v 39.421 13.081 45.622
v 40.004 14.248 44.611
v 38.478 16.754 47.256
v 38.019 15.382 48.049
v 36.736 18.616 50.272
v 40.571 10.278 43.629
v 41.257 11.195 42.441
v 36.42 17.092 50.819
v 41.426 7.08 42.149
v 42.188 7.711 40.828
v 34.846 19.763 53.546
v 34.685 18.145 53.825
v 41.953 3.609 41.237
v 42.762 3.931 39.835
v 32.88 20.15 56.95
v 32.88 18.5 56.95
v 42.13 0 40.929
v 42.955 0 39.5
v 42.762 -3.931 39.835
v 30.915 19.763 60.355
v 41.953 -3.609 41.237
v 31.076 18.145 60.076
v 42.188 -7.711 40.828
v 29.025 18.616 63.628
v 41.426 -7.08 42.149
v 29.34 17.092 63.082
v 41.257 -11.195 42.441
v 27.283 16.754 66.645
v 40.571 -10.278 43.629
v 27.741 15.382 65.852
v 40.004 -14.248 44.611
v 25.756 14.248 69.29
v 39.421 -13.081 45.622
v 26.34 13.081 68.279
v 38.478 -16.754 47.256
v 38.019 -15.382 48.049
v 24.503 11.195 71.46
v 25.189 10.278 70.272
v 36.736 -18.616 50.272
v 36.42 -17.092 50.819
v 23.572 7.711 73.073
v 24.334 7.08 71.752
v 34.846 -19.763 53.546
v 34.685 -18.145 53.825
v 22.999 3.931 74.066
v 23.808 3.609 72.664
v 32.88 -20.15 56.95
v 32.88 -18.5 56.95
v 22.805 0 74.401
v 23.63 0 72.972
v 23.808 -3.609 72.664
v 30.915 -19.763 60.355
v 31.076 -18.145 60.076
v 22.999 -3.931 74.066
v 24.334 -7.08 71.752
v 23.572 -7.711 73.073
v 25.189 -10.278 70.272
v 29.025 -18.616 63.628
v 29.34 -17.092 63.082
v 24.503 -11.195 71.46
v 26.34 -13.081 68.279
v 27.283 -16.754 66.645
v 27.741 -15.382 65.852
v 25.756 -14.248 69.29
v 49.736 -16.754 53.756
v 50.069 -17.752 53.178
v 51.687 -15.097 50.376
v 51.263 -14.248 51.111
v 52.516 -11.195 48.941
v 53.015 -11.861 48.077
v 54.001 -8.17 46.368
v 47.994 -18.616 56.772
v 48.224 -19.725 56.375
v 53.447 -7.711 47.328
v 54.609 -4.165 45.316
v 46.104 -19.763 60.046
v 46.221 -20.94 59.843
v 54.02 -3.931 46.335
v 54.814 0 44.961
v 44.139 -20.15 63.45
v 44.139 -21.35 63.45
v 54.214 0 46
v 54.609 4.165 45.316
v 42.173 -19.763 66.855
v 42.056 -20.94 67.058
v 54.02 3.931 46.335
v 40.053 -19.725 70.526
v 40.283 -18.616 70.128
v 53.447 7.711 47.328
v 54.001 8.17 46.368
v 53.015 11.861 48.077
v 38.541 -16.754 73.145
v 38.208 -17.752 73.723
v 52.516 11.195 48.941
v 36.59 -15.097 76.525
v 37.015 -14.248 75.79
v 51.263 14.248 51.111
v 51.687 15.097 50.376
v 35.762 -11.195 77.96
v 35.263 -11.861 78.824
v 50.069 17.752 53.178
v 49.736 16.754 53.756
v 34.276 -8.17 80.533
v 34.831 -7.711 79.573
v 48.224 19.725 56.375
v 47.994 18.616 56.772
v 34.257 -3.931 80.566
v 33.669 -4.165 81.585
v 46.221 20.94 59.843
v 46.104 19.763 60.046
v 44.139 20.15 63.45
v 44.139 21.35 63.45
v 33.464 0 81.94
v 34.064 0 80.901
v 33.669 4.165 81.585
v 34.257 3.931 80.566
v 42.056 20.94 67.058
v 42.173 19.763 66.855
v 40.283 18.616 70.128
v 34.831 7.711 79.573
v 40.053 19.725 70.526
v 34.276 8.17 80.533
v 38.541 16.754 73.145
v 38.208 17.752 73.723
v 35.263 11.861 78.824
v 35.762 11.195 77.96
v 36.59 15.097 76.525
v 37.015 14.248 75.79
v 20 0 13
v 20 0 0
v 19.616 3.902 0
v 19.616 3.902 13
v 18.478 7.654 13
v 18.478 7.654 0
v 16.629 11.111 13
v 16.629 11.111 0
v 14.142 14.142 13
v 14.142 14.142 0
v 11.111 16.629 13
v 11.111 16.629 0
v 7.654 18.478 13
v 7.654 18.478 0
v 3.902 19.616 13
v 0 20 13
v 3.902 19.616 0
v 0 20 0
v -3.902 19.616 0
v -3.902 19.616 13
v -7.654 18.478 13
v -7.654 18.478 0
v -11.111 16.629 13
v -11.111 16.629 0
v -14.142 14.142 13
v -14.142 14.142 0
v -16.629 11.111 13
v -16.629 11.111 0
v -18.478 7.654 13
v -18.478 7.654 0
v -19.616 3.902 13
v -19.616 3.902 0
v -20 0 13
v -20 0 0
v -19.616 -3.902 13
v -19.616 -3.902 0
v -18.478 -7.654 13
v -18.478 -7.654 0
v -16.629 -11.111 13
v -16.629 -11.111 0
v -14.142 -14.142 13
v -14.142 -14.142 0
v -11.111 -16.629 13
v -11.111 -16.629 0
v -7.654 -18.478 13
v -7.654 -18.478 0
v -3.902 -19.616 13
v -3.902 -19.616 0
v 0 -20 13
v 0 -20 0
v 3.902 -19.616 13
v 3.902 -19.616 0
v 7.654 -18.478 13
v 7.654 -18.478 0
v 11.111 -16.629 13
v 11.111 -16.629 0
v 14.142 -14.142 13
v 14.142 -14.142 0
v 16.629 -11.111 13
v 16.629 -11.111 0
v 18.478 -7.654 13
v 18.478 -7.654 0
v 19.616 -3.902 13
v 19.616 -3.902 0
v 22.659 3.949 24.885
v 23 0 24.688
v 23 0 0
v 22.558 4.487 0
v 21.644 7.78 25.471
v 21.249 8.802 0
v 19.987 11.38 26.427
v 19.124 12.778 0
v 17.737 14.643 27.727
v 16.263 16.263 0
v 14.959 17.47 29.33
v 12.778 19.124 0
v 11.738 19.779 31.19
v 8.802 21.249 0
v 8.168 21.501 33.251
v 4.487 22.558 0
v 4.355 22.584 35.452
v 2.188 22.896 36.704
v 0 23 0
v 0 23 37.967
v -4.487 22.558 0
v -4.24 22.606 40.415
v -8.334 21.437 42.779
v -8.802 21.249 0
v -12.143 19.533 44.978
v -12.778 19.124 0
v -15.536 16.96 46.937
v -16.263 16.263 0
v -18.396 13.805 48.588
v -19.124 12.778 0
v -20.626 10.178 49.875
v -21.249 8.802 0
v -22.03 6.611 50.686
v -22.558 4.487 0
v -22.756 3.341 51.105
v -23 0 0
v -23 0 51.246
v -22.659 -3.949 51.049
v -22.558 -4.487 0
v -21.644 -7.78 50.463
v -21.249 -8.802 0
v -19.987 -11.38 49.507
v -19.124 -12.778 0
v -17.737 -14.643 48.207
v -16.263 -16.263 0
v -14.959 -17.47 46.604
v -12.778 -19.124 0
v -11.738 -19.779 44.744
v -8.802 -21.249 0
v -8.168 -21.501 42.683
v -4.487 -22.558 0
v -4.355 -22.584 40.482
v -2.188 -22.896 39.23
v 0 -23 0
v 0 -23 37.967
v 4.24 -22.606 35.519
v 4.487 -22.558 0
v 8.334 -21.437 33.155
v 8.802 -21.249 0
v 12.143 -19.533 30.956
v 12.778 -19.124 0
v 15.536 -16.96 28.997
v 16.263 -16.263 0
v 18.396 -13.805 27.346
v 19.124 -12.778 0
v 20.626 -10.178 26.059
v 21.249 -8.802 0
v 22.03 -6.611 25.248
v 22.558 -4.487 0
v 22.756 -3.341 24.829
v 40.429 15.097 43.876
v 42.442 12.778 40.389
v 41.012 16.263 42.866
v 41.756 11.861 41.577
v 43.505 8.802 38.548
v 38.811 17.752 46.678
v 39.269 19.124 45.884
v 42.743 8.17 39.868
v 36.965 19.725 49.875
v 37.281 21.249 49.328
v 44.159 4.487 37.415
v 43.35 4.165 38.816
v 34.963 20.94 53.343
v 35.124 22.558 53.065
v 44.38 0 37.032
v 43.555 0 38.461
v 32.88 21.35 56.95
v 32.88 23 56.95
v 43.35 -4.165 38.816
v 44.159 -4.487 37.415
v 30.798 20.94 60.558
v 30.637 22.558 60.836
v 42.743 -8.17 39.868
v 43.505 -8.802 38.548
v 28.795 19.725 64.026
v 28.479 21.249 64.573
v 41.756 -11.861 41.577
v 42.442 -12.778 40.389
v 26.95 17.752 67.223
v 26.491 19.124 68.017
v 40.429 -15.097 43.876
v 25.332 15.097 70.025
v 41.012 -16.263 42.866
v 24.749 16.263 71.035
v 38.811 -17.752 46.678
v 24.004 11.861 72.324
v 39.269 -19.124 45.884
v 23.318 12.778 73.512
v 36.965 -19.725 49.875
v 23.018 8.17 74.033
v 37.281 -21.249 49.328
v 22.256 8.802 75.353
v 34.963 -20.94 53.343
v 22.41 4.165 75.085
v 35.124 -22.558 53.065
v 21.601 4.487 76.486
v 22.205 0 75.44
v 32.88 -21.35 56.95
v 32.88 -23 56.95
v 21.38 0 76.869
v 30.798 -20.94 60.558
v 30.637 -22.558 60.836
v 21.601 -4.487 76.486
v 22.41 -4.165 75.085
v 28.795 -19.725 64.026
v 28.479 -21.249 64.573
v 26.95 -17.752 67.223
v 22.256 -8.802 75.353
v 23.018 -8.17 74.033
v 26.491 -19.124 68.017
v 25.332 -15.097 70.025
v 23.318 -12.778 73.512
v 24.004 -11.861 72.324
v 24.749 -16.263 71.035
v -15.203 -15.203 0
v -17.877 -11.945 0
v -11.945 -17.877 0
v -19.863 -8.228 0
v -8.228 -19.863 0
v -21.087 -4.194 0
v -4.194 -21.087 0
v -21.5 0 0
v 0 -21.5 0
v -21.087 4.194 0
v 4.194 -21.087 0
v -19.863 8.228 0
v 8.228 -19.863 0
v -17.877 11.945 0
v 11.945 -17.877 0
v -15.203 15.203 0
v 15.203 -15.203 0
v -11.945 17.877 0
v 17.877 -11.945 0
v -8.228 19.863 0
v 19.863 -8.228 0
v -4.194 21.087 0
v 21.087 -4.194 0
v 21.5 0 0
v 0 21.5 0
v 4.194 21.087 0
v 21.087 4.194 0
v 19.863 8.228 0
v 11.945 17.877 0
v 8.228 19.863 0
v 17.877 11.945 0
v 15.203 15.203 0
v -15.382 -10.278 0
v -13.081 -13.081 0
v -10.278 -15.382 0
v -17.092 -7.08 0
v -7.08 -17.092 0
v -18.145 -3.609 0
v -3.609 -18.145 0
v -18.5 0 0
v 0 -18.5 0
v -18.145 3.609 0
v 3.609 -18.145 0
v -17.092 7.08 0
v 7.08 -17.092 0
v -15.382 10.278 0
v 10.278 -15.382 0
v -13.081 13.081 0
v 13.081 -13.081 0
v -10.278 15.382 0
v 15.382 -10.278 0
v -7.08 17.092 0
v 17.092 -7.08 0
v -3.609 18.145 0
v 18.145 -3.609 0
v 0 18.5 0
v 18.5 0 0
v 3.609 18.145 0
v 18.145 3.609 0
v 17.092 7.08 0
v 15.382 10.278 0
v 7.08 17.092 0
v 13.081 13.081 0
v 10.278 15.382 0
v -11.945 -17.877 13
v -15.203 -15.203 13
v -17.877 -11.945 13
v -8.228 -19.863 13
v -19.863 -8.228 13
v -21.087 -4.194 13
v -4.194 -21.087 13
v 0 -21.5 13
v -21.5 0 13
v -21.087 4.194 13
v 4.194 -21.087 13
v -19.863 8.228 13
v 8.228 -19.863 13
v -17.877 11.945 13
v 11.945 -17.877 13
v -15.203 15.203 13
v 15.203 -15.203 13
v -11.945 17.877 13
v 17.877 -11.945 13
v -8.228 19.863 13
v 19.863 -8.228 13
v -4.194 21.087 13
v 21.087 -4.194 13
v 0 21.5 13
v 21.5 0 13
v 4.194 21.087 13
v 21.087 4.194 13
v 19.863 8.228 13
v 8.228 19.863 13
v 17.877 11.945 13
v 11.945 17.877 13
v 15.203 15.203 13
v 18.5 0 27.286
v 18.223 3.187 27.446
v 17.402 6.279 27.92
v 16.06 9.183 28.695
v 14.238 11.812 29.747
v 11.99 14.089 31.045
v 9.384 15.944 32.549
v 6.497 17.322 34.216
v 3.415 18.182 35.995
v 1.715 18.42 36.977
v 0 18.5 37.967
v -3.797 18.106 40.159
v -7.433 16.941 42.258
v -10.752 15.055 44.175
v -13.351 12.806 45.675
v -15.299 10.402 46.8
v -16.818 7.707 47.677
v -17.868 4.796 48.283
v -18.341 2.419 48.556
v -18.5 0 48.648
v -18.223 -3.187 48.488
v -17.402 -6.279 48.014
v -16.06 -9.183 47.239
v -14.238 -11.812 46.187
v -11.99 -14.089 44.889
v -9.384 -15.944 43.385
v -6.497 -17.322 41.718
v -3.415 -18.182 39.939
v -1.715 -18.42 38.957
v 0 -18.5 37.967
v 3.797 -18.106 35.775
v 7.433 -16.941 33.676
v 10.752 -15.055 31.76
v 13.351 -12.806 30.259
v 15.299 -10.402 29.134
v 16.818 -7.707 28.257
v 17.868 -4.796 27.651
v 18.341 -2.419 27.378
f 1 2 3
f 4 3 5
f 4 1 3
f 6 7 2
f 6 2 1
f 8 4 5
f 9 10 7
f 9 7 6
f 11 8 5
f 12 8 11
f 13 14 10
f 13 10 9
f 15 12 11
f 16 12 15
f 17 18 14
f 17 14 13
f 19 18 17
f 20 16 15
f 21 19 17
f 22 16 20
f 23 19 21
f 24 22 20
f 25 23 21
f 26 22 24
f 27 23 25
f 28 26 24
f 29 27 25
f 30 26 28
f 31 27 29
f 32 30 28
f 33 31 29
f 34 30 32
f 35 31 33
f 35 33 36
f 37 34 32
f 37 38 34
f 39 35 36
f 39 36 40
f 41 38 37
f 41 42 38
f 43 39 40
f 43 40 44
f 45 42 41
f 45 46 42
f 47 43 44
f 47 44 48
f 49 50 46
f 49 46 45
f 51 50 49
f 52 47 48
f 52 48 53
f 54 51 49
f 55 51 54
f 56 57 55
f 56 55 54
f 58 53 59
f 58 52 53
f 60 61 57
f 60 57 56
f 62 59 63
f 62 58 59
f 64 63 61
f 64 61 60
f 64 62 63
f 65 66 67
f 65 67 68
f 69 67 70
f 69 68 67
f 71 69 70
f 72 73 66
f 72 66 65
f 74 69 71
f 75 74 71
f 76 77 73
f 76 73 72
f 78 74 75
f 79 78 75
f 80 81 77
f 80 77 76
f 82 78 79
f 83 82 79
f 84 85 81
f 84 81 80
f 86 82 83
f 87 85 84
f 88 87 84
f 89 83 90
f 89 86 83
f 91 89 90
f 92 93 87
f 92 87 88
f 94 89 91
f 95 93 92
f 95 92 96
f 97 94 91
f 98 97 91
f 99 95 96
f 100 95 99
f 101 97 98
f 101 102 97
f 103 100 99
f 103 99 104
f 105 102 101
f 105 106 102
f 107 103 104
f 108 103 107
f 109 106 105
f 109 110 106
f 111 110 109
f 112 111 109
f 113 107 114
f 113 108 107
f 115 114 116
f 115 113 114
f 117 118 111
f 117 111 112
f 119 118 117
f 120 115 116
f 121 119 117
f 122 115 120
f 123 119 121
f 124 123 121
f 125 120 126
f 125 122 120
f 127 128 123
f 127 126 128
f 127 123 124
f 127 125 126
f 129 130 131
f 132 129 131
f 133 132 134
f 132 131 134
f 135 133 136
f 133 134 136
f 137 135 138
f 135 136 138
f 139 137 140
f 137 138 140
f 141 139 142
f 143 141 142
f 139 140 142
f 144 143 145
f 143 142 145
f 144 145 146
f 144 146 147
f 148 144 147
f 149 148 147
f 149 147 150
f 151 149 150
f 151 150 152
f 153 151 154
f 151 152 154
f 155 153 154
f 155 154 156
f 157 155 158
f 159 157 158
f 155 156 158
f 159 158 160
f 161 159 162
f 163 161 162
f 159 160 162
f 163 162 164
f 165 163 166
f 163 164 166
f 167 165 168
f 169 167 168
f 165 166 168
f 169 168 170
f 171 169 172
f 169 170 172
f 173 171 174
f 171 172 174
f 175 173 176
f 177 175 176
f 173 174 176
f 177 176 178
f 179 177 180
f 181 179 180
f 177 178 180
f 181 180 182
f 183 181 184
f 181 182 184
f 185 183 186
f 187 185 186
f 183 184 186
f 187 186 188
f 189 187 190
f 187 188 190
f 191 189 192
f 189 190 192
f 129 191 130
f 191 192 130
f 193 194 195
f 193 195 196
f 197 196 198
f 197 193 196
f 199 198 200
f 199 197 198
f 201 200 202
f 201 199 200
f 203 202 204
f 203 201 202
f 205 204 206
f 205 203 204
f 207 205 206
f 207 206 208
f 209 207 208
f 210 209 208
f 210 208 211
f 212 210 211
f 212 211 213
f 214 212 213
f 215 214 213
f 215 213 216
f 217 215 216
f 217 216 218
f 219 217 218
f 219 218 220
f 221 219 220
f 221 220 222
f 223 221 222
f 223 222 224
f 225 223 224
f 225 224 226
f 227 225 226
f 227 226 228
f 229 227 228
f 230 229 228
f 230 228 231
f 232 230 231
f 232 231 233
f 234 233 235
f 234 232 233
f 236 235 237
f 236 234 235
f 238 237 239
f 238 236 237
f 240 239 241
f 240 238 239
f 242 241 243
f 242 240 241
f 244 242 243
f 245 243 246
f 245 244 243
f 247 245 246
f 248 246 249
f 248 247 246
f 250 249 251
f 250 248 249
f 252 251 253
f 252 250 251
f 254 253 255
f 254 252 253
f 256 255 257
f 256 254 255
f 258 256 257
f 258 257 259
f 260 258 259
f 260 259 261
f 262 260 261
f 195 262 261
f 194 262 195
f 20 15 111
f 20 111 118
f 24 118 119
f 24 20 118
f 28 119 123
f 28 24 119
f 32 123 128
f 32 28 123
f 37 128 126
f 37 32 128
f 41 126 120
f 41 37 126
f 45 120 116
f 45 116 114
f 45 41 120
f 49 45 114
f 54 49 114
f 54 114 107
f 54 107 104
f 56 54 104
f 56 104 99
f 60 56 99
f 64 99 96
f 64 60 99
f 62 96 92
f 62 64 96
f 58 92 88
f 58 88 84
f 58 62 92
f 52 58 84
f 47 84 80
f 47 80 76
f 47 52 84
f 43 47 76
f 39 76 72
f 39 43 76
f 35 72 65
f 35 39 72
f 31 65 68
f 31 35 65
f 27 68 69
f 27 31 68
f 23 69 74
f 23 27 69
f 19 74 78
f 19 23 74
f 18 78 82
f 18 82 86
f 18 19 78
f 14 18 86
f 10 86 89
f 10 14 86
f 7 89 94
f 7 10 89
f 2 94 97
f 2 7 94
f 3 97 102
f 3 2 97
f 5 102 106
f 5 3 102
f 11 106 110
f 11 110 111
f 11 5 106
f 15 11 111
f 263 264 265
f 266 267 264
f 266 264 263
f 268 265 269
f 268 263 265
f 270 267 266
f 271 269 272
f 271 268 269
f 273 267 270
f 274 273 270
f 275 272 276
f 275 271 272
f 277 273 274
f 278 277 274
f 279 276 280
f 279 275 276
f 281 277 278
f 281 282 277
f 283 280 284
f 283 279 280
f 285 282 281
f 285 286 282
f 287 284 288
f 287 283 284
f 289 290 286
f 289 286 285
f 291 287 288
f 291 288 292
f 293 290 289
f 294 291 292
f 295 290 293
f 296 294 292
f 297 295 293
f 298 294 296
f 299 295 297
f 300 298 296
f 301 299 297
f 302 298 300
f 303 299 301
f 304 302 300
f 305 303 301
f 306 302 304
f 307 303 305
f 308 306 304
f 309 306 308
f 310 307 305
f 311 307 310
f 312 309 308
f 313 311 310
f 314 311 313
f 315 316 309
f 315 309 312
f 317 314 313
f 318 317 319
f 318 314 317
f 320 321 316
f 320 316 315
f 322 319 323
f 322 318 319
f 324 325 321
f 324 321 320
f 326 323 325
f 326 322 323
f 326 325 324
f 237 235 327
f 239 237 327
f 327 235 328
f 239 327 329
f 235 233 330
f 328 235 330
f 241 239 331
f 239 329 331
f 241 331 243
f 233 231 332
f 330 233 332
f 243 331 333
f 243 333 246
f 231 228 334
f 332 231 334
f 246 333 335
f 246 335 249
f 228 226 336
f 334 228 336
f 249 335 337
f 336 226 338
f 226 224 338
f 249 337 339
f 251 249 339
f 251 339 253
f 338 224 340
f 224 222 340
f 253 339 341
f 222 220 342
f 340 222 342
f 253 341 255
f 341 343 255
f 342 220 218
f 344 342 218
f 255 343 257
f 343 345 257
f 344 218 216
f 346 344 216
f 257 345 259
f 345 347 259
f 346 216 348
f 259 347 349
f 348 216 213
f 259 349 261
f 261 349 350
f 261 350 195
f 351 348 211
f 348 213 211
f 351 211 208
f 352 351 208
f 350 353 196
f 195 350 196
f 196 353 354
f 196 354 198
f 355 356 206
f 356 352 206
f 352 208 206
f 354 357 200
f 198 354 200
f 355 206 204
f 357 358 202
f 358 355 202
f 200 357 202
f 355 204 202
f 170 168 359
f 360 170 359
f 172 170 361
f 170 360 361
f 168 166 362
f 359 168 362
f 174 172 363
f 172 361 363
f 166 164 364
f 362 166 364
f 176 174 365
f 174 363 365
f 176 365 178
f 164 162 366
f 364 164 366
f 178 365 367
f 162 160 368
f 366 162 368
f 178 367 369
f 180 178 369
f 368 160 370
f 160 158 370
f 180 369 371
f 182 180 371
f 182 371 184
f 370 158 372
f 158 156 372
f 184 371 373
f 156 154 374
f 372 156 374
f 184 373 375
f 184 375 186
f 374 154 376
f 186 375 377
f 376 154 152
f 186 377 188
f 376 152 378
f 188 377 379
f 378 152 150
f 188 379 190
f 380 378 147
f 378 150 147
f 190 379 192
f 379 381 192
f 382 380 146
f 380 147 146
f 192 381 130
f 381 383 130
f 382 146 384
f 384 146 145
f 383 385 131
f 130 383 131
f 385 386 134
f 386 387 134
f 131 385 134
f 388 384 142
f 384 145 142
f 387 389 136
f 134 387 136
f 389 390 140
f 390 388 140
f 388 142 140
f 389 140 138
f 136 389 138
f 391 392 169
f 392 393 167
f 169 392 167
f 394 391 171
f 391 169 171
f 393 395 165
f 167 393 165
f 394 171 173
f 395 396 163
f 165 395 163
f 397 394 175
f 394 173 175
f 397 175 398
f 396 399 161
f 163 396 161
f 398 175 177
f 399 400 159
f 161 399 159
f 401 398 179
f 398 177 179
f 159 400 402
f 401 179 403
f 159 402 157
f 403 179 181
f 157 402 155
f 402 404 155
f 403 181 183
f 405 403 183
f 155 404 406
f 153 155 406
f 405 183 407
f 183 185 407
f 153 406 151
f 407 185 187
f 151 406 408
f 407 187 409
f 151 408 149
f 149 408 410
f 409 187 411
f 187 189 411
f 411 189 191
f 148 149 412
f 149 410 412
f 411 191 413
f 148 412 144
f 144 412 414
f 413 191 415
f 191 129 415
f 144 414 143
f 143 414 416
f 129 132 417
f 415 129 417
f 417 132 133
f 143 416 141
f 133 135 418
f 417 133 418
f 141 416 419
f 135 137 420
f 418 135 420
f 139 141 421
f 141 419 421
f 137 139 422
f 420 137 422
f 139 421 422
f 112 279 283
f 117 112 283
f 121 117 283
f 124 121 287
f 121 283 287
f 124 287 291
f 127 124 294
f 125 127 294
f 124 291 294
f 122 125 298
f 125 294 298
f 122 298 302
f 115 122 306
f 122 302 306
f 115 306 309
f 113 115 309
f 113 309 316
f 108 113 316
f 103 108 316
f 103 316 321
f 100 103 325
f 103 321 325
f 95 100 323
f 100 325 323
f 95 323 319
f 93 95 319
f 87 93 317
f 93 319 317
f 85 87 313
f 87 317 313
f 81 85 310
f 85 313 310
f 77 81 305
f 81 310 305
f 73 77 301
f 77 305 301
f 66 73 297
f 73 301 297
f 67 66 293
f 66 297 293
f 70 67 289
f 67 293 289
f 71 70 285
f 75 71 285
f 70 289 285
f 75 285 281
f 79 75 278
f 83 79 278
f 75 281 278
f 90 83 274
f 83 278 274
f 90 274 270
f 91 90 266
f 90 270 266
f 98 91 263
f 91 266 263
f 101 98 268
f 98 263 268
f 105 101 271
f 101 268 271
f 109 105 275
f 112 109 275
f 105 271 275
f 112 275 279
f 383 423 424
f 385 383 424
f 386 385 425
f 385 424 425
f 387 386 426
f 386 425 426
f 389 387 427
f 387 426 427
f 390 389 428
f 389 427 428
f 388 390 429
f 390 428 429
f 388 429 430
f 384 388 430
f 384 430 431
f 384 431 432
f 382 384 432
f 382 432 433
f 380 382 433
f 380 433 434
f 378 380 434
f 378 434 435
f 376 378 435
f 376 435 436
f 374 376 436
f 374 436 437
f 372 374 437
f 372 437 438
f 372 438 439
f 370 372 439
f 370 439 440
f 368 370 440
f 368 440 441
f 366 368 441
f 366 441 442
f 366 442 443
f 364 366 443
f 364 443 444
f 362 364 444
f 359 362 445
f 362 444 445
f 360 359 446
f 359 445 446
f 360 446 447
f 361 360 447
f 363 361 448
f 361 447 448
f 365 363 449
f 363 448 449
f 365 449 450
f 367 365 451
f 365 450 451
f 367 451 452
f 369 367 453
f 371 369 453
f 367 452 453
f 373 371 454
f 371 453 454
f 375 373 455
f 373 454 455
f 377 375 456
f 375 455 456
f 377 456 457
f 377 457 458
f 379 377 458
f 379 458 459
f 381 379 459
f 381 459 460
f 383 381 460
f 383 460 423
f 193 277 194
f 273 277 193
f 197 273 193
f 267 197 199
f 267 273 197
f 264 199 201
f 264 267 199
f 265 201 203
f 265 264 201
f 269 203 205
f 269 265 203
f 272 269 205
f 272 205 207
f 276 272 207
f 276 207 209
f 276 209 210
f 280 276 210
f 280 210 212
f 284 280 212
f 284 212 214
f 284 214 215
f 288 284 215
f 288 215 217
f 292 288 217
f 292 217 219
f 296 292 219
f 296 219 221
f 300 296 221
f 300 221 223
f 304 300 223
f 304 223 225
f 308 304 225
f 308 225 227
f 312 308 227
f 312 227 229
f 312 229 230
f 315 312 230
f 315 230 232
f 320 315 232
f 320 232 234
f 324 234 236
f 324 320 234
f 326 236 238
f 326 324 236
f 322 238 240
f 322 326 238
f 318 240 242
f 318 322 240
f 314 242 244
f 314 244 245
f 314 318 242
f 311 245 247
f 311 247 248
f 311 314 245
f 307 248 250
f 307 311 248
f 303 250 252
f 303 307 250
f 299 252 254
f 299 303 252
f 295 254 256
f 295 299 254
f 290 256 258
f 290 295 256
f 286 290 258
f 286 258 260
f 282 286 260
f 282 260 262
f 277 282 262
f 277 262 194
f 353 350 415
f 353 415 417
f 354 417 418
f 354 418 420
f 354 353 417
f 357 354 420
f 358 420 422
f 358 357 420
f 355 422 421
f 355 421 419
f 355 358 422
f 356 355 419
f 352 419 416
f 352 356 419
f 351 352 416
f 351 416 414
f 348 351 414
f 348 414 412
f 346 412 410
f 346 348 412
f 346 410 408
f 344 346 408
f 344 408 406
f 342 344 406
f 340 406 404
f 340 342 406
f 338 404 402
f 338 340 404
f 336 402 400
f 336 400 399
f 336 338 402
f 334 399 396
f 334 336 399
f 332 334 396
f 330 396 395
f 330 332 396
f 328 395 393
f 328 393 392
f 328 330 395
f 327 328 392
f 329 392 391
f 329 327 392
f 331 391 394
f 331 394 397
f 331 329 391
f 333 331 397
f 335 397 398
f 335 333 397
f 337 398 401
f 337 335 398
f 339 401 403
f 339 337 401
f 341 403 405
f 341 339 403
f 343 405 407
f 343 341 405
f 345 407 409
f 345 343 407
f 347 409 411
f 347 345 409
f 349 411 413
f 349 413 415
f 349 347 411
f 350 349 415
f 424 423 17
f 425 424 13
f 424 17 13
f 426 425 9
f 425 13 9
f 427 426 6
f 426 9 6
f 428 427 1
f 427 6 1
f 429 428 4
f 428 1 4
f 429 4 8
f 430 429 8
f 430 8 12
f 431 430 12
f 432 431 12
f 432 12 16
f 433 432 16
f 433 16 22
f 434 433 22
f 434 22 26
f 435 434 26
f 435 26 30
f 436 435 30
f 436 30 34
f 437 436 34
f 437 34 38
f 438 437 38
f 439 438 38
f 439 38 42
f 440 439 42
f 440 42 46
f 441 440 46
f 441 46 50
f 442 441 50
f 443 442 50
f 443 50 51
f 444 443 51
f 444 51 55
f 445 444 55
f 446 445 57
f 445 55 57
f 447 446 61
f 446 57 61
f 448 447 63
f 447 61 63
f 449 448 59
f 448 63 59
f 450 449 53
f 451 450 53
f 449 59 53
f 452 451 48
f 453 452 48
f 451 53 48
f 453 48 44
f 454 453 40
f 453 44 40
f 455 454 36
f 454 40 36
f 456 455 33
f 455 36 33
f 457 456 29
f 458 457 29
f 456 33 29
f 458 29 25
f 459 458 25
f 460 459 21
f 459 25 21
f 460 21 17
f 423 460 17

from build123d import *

# Parameters (mm, degrees)
F1_R     = 23
F1_R_2   = 21.5
F1_R_3   = 20
F1_R_4   = 18.5
F3_R     = 21.35
F3_R_2   = 20.15
F4_DEPTH = 13
F5_DEPTH = 13


with BuildPart() as f2:
    # F2: sweep along a path in F0
    with BuildLine(Plane.XZ) as f2_path:
        Line((0, 0), (0, 37.9670113325))
        Line((0, 37.9670113325), (32.880303367, 56.9504633325))
    # F1 (on Top) → F2 (sweep)
    with BuildSketch(Plane.XY):
        Circle(F1_R)
        Circle(F1_R_2, mode=Mode.SUBTRACT)
        Circle(F1_R_2)
        Circle(F1_R_3, mode=Mode.SUBTRACT)
        Circle(F1_R_3)
        Circle(F1_R_4, mode=Mode.SUBTRACT)
    sweep(path=f2_path.line, transition=Transition.RIGHT)

    # F3 (on face) → F4 (join)
    with BuildSketch(Plane(origin=(49.3205015269, 0, 28.4752048331), x_dir=(0, 1, 0), z_dir=(0.8660254038, 0, 0.5))):
        with Locations((0, 32.8803963197)):
            Circle(F3_R)
        with Locations((0, 32.8803963197)):
            Circle(F3_R_2, mode=Mode.SUBTRACT)
    extrude(amount=F4_DEPTH)

    # F1 (on Top) → F5 (cut)
    with BuildSketch(Plane.XY):
        Circle(F1_R_2)
        Circle(F1_R_3, mode=Mode.SUBTRACT)
    extrude(amount=F5_DEPTH, mode=Mode.SUBTRACT)


solid = f2.part
